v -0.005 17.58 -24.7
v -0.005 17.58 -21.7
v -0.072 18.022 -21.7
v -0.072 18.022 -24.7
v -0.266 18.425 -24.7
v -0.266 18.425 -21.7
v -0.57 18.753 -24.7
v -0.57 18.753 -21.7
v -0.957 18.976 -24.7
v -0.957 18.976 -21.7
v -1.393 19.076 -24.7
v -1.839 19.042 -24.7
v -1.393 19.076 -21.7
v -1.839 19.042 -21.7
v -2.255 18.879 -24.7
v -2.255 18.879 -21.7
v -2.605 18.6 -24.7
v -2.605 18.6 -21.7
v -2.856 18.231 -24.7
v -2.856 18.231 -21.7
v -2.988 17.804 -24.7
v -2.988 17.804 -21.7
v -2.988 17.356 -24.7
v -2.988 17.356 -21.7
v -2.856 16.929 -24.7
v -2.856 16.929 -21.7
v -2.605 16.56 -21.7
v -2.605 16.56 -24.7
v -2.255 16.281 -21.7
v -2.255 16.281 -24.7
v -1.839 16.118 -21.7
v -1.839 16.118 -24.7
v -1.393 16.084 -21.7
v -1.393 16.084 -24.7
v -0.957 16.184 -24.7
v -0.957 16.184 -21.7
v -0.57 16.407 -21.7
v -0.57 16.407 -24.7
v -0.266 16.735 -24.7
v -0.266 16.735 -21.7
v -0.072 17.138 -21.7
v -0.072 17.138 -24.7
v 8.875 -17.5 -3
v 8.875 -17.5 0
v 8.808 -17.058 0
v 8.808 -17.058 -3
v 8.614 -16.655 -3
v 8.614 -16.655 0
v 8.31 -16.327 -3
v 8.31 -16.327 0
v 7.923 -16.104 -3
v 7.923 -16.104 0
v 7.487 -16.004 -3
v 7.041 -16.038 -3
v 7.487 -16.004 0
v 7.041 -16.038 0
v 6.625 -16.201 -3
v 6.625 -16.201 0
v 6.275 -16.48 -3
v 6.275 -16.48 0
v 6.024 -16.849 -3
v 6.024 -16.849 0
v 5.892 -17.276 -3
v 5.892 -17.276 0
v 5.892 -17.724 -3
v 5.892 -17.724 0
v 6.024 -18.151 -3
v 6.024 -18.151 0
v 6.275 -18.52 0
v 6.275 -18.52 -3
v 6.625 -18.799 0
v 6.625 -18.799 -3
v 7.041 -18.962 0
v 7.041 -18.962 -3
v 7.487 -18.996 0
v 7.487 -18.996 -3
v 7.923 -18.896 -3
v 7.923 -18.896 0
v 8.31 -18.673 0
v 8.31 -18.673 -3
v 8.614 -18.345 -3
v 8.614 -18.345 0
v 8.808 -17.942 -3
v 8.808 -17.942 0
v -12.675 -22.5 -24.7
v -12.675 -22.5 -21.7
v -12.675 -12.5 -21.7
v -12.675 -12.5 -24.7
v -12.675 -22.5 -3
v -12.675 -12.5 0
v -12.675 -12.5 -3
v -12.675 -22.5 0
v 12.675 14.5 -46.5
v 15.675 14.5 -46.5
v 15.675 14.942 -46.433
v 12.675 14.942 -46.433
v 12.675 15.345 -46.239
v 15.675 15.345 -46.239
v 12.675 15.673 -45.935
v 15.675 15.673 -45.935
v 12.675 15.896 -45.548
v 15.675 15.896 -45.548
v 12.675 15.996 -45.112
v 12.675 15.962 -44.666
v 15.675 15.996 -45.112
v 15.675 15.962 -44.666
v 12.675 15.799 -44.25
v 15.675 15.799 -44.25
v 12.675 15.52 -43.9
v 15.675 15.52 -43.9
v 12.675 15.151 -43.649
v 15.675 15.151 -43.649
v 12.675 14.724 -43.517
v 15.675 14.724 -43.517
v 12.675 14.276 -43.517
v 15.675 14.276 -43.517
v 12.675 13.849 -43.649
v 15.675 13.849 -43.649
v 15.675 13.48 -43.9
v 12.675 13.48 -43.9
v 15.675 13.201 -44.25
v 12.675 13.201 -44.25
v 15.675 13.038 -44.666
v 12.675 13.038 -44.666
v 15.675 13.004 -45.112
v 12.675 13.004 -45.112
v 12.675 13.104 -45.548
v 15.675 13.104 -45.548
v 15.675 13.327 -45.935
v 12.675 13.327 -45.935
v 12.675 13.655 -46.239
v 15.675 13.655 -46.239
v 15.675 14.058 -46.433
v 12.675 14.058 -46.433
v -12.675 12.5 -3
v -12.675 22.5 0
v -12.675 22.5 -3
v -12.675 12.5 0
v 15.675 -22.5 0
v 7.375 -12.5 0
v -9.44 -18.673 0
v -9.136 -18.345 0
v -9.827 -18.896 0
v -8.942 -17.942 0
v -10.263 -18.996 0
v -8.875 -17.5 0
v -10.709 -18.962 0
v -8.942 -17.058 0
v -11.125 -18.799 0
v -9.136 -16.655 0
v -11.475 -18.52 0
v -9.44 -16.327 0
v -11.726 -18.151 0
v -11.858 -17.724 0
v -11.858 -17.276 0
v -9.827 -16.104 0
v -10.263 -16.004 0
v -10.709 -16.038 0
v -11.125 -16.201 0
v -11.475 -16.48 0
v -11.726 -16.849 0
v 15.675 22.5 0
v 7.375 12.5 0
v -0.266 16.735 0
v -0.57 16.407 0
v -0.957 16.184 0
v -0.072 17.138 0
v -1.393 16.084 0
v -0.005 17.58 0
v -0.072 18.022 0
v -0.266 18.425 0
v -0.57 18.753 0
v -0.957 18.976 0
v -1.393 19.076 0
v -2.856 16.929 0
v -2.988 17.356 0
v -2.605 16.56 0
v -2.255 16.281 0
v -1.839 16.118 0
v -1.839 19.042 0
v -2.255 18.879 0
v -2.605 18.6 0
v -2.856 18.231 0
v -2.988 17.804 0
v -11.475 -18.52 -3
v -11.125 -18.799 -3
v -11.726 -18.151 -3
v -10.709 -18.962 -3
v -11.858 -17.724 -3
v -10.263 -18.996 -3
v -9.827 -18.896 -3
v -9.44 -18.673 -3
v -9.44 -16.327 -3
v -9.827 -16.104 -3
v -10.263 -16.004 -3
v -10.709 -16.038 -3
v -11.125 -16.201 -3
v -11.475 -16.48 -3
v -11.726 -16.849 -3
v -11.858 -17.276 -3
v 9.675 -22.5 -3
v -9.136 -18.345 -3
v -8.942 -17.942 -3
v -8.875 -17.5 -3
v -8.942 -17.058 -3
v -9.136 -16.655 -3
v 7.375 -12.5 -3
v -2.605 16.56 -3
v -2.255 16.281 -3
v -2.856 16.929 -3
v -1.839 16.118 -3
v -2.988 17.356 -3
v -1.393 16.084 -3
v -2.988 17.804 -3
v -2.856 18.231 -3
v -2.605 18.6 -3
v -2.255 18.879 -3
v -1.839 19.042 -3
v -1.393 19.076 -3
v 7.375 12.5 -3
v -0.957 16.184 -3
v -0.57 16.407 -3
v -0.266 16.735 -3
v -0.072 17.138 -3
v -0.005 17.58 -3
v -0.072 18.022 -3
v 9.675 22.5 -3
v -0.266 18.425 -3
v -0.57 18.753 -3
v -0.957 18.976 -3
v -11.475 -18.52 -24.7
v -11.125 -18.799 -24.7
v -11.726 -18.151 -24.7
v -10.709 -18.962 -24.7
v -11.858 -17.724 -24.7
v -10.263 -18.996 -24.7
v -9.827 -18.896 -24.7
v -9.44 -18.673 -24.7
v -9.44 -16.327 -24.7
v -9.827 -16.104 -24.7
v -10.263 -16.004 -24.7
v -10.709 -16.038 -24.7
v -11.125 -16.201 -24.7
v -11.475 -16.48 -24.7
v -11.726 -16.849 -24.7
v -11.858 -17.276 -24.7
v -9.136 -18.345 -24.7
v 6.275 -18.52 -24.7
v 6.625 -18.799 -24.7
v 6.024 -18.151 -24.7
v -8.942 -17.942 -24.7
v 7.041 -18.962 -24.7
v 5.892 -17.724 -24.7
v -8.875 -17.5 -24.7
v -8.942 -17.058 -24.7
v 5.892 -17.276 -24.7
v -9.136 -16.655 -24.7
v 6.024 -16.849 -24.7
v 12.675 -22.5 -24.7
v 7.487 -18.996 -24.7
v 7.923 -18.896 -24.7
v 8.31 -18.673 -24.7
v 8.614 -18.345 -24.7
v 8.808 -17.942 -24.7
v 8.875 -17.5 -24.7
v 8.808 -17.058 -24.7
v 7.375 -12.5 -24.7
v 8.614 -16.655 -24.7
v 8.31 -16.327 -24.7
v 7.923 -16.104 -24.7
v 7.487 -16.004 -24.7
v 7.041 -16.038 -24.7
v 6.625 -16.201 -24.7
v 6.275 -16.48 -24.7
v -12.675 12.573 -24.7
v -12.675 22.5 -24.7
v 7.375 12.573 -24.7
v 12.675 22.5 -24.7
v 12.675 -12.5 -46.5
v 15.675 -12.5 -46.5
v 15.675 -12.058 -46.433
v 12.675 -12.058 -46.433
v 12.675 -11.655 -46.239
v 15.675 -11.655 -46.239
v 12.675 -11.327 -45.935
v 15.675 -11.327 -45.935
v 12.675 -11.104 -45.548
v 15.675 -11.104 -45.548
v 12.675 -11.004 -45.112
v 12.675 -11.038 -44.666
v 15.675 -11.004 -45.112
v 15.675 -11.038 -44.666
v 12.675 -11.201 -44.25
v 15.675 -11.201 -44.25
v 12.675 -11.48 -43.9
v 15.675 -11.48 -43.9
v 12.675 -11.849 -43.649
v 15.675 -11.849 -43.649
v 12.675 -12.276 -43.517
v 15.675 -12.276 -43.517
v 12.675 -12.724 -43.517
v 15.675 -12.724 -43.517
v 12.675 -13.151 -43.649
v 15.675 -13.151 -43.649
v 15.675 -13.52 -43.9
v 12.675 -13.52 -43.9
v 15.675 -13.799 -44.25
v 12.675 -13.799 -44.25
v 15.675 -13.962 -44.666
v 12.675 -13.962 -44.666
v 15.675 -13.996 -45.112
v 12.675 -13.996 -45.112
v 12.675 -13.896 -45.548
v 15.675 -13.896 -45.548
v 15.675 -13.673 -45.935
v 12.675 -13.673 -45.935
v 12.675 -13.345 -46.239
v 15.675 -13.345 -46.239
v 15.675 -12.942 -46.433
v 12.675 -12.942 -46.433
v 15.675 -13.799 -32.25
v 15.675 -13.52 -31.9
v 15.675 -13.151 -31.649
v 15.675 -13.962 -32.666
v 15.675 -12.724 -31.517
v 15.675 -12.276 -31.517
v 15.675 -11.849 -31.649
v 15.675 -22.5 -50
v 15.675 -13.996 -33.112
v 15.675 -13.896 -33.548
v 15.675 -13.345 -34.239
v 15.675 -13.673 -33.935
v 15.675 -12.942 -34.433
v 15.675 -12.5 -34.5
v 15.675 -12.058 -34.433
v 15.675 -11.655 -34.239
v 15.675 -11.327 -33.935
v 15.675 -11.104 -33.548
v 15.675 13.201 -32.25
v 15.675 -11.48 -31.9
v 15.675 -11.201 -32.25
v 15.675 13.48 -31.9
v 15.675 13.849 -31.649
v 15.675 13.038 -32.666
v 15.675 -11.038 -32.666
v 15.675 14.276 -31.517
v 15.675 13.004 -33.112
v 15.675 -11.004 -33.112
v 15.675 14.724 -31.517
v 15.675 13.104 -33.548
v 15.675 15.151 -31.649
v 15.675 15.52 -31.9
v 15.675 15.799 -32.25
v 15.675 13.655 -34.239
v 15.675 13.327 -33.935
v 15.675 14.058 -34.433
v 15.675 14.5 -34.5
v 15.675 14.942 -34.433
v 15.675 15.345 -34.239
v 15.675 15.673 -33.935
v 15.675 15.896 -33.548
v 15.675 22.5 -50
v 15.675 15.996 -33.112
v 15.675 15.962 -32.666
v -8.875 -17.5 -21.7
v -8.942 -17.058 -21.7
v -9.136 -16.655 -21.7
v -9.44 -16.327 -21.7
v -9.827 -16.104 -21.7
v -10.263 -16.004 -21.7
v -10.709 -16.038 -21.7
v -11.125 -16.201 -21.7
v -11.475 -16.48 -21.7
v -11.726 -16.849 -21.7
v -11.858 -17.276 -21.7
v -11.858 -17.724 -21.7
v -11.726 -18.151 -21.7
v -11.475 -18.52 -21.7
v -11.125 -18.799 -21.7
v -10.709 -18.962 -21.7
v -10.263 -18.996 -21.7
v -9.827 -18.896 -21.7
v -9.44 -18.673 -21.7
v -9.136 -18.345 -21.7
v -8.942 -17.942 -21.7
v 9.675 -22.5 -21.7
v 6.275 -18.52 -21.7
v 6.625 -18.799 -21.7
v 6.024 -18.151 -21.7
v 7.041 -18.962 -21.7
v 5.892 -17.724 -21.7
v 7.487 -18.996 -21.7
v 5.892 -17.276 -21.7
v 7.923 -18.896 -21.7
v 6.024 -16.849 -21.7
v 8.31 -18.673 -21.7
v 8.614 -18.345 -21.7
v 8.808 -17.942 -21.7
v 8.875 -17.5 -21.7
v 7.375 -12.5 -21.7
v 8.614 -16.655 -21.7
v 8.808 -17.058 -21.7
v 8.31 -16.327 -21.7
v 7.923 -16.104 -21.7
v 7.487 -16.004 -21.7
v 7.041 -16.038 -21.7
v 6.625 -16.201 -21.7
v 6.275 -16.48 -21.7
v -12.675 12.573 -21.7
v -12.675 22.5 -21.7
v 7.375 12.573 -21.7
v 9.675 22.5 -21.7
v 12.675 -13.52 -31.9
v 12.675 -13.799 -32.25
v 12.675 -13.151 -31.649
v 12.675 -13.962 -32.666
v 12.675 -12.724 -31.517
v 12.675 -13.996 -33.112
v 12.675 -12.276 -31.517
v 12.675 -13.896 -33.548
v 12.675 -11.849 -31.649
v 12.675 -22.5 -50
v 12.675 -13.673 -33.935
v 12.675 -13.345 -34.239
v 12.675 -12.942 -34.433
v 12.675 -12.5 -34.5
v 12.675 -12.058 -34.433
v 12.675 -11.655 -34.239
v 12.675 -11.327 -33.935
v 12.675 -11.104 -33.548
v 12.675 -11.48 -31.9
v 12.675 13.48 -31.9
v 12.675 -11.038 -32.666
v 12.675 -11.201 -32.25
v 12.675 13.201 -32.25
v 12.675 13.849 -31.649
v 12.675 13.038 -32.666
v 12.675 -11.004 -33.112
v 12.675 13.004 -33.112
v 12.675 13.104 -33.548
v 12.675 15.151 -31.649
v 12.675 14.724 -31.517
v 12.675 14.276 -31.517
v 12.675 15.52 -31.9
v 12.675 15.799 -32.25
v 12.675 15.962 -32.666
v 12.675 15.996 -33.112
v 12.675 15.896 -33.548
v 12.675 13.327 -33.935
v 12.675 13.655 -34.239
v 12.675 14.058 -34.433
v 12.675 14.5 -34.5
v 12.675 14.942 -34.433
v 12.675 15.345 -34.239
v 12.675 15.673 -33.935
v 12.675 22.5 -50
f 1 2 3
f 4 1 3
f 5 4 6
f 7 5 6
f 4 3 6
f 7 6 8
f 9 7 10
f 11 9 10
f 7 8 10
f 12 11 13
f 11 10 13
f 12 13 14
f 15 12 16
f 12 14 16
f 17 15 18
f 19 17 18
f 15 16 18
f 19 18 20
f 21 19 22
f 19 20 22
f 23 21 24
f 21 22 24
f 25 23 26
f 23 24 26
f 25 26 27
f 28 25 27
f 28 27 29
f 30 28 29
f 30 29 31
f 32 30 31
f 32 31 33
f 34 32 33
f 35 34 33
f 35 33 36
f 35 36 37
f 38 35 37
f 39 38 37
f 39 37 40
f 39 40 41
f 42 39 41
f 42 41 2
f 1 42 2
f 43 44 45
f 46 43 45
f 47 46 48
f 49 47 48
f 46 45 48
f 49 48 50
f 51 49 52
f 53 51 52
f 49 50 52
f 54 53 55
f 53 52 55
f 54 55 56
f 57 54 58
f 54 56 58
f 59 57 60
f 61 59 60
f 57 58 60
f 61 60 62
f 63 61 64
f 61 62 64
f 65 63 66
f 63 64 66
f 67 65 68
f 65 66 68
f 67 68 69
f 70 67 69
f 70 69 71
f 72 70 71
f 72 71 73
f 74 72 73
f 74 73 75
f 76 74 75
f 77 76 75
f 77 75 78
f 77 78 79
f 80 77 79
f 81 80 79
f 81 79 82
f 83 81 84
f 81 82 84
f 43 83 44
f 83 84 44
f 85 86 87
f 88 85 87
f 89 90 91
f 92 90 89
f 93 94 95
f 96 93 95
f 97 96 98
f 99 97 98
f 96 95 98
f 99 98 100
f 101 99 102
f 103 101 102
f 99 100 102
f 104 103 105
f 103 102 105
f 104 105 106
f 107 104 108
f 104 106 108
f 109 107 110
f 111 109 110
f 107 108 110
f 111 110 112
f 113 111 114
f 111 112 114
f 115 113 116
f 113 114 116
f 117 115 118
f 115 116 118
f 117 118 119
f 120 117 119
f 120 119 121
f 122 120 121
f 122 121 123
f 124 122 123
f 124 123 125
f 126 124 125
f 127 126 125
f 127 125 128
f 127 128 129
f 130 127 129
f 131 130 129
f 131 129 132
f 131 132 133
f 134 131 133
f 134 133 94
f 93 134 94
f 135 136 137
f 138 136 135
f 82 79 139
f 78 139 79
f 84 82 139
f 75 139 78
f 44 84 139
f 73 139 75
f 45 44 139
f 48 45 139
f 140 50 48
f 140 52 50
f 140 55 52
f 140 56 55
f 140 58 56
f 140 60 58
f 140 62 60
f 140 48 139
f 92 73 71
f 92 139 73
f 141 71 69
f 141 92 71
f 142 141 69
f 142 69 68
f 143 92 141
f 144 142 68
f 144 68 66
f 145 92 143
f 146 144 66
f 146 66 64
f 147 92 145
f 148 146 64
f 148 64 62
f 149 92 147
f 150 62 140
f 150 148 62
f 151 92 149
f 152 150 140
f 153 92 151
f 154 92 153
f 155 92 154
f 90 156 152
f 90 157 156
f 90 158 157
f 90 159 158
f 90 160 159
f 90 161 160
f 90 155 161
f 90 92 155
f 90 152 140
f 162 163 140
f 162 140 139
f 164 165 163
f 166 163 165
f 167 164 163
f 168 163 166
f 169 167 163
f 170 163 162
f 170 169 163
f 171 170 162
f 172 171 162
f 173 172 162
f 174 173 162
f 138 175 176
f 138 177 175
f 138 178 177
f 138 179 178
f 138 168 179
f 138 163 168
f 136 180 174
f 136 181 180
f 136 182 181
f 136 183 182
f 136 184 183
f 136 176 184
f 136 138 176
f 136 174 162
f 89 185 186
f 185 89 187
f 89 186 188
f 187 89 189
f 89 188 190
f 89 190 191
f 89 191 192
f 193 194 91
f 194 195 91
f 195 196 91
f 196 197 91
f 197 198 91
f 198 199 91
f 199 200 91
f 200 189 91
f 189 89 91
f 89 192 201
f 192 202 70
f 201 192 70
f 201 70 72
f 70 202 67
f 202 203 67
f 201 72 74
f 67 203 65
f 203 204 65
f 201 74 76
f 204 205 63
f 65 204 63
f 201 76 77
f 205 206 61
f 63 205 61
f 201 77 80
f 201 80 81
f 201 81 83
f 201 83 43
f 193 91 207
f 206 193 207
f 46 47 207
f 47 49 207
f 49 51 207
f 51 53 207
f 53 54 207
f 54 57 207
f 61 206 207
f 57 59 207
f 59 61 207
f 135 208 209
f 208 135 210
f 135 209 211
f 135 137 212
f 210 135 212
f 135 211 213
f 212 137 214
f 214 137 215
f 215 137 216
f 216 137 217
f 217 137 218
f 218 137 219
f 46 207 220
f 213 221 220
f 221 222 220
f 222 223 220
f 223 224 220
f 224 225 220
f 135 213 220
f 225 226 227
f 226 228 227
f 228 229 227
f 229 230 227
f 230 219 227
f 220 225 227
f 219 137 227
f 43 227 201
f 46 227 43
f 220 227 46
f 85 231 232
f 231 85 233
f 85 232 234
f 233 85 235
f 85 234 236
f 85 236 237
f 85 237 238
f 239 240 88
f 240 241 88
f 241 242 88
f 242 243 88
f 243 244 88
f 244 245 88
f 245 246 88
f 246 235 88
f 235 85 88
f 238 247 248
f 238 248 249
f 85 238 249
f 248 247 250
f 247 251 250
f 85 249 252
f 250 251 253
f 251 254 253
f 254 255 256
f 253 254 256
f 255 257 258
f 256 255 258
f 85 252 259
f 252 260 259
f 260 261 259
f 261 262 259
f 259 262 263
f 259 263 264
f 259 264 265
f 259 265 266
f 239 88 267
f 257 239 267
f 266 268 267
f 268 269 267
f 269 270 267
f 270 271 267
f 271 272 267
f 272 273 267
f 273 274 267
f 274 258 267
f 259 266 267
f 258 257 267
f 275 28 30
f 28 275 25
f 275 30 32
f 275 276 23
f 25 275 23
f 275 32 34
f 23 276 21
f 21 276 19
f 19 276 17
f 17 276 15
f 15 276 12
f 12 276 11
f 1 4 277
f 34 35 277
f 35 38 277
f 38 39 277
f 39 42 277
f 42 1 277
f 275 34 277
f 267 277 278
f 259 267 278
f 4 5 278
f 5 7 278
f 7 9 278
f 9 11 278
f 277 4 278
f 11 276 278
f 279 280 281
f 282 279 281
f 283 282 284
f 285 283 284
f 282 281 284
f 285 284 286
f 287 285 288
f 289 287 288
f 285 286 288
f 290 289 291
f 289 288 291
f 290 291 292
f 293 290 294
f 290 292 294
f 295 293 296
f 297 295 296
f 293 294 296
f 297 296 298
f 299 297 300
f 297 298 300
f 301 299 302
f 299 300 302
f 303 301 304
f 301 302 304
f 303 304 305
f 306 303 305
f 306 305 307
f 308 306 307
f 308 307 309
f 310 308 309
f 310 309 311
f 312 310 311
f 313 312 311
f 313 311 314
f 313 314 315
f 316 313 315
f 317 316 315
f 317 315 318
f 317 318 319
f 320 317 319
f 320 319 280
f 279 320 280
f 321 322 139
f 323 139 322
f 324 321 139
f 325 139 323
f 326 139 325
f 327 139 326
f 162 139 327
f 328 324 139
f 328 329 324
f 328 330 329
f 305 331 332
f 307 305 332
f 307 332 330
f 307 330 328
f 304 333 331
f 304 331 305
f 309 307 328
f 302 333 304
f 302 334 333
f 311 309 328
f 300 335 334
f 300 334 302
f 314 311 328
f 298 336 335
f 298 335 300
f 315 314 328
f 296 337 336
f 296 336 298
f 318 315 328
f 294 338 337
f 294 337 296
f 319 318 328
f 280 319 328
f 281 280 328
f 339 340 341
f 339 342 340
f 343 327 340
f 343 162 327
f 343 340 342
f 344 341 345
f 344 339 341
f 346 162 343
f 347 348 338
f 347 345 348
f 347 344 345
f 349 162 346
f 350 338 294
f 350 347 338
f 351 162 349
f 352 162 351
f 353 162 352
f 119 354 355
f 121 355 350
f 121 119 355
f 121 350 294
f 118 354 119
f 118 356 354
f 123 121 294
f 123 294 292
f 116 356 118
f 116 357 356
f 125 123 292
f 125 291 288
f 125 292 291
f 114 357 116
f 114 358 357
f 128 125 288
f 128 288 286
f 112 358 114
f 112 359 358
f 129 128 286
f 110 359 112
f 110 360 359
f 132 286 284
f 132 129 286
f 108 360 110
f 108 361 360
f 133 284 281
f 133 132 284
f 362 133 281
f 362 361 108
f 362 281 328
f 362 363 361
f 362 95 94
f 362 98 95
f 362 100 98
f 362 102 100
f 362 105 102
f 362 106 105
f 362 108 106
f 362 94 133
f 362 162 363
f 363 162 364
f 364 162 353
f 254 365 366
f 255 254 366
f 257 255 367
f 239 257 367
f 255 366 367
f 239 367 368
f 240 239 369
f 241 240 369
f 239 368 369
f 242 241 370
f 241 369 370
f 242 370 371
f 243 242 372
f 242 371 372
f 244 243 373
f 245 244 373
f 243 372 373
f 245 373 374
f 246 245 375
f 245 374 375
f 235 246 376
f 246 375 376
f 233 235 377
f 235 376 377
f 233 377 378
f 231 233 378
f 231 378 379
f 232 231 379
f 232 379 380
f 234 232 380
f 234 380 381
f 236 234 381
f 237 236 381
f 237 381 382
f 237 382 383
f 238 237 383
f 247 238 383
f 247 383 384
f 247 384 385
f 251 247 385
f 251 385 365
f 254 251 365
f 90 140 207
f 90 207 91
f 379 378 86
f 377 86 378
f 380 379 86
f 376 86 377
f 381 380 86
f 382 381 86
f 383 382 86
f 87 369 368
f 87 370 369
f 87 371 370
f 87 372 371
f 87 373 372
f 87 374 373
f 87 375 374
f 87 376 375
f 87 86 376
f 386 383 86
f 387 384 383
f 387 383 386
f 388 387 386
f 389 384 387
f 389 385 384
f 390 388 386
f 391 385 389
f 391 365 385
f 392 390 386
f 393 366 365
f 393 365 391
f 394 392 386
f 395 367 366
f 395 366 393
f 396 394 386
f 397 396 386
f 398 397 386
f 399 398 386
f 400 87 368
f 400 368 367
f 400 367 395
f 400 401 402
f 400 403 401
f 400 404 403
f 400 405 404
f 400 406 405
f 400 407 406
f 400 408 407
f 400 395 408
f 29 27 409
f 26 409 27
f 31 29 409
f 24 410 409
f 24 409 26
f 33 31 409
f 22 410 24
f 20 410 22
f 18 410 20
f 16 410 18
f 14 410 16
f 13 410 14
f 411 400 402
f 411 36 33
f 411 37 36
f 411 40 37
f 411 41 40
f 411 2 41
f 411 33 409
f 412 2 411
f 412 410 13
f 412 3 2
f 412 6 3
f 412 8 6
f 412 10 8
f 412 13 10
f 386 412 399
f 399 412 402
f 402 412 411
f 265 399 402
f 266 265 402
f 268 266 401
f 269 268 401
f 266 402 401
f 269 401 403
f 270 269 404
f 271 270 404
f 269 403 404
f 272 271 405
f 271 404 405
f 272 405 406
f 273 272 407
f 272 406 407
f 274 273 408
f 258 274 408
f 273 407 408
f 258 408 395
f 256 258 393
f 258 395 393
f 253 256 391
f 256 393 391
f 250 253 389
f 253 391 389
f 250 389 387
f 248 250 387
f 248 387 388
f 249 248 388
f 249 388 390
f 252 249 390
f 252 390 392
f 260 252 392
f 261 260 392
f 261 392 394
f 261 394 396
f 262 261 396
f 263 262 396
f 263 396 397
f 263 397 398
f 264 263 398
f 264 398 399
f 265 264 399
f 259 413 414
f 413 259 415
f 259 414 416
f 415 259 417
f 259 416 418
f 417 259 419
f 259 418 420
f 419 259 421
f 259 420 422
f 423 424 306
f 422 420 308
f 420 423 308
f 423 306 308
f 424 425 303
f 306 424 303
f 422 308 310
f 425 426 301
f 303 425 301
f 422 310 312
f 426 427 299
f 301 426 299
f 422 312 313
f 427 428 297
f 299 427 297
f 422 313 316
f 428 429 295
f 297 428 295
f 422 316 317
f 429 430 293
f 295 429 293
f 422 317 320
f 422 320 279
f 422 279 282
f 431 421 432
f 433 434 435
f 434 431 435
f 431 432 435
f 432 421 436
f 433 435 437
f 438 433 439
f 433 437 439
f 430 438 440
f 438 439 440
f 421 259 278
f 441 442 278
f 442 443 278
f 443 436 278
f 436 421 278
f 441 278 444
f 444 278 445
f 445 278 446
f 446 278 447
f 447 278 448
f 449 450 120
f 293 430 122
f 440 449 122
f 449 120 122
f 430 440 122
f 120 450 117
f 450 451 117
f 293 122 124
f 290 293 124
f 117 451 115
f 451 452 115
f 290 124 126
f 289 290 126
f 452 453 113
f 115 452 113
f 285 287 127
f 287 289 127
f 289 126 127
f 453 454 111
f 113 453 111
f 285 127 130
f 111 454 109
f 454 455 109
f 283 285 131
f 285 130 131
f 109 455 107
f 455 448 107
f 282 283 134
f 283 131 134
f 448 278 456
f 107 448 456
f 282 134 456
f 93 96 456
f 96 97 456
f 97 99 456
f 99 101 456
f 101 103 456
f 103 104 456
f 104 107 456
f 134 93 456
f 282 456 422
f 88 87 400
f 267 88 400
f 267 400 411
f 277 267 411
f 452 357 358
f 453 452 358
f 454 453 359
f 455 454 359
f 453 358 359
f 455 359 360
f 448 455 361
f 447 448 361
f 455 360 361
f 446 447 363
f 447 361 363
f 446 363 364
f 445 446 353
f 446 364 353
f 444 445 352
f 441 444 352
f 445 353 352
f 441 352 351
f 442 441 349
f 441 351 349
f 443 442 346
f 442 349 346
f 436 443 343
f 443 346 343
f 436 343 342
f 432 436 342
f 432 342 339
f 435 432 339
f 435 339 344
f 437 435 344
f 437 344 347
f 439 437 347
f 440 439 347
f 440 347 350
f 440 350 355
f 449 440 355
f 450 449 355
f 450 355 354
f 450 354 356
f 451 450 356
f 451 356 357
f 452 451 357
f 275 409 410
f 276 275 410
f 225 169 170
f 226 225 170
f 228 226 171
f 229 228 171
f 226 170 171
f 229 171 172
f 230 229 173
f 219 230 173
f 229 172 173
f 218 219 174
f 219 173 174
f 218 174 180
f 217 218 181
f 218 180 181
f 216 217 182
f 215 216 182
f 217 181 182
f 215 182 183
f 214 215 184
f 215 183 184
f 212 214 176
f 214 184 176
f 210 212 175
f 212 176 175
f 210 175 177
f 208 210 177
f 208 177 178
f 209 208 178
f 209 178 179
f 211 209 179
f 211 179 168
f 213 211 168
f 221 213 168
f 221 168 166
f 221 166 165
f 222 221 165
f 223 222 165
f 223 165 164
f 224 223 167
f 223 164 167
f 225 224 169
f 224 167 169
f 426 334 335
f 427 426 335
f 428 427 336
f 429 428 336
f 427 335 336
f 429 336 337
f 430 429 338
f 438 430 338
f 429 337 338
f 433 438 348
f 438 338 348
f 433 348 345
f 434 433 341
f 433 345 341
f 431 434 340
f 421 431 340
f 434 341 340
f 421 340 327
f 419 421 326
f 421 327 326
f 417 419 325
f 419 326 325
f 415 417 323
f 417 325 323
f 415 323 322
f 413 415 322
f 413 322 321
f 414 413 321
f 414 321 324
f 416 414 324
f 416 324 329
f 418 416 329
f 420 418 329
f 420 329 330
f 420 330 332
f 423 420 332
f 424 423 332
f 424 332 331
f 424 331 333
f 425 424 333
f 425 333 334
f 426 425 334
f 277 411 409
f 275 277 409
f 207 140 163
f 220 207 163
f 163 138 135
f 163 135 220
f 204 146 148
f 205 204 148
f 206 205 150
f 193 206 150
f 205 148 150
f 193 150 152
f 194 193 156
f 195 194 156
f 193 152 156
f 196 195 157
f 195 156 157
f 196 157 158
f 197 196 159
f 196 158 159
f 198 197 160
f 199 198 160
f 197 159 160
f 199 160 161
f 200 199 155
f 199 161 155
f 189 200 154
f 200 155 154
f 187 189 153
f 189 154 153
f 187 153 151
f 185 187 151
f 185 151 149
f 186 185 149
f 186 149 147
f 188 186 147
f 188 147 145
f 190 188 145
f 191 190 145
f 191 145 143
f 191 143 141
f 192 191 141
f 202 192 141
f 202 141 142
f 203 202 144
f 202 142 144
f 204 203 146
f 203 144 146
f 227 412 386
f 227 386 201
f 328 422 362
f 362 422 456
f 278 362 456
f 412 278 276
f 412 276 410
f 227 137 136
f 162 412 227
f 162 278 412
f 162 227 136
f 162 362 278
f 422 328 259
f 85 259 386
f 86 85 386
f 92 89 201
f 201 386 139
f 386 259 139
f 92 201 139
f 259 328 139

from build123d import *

# Parameters (mm, degrees)
SKETCH2_W           = 5.3
SKETCH2_H           = 25
SKETCH2_R           = 1.5
BOSS_EXTRUDE1_DEPTH = 3
SKETCH3_W           = 50
SKETCH3_H           = 45
BOSS_EXTRUDE2_DEPTH = 3
SKETCH7_W           = 38.35
SKETCH7_H           = 3
BOSS_EXTRUDE3_DEPTH = 45
CUT_EXTRUDE1_DEPTH  = 5
SKETCH8_3_R         = 1.5
CUT_EXTRUDE2_DEPTH  = 5
SKETCH11_R          = 1.5
CUT_EXTRUDE4_DEPTH  = 5
SKETCH12_W          = 18.7
SKETCH12_H          = 45
BOSS_EXTRUDE4_DEPTH = 3


with BuildPart() as part:
    # Sketch2 → Boss-Extrude1 (new body)
    # profile 1 of 3: a face of its own
    with BuildSketch(Plane.XY):
        with Locations((10.025, 0)):
            Rectangle(SKETCH2_W, SKETCH2_H)
    # profile 2 of 3: a face of its own
    with BuildSketch(Plane.XY):
        Polygon((7.375, 12.5), (12.675, 12.5), (12.675, 22.5), (-12.675, 22.5), (-12.675, 12.5), align=None)
        with Locations((-1.505, 17.58)):
            Circle(SKETCH2_R, mode=Mode.SUBTRACT)
    # profile 3 of 3: a face of its own
    with BuildSketch(Plane.XY):
        Polygon((-12.675, -22.5), (12.675, -22.5), (12.675, -12.5), (7.375, -12.5), (-12.675, -12.5), align=None)
        with Locations((-10.375, -17.5)):
            Circle(SKETCH2_R, mode=Mode.SUBTRACT)
        with Locations((7.375, -17.5)):
            Circle(SKETCH2_R, mode=Mode.SUBTRACT)
    extrude(amount=-BOSS_EXTRUDE1_DEPTH)

    # Sketch3 → Boss-Extrude2 (add)
    with BuildSketch(Plane(origin=(12.675, 0, 0), x_dir=(0, 0, -1), z_dir=(1, 0, 0))):
        with Locations((25, 0)):
            Rectangle(SKETCH3_W, SKETCH3_H)
    extrude(amount=BOSS_EXTRUDE2_DEPTH)

    # Sketch7 → Boss-Extrude3 (add)
    with BuildSketch(Plane(origin=(0, 22.5, 0), x_dir=(1, 0, 0), z_dir=(0, 1, 0))):
        with Locations((-3.5, 23.2)):
            Rectangle(SKETCH7_W, SKETCH7_H)
    extrude(amount=-BOSS_EXTRUDE3_DEPTH)

    # Sketch8 → Cut-Extrude1 (cut)
    with BuildSketch(Plane.XY.offset(-21.7)):
        Polygon((-12.675, 12.572802409), (-12.675, 22.5), (-22.675, 22.5), (-22.675, -22.5), (-12.675, -22.5), (-12.675, -12.5), (7.375, -12.5), (7.375, 12.572802409), align=None)
    extrude(amount=-CUT_EXTRUDE1_DEPTH, mode=Mode.SUBTRACT)

    # Sketch8<3> → Cut-Extrude2 (cut)
    with BuildSketch(Plane.XY.offset(-21.7)):
        with Locations((-1.505, 17.58)):
            Circle(SKETCH8_3_R)
        with Locations((-10.375, -17.5)):
            Circle(SKETCH8_3_R)
        with Locations((7.375, -17.5)):
            Circle(SKETCH8_3_R)
    extrude(amount=-CUT_EXTRUDE2_DEPTH, mode=Mode.SUBTRACT)

    # Sketch11 → Cut-Extrude4 (cut)
    with BuildSketch(Plane(origin=(15.675, 0, 0), x_dir=(0, 0, -1), z_dir=(1, 0, 0))):
        with Locations((33, 14.5)):
            Circle(SKETCH11_R)
        with Locations((45, 14.5)):
            Circle(SKETCH11_R)
        with Locations((33, -12.5)):
            Circle(SKETCH11_R)
        with Locations((45, -12.5)):
            Circle(SKETCH11_R)
    extrude(amount=-CUT_EXTRUDE4_DEPTH, mode=Mode.SUBTRACT)

    # Sketch12 → Boss-Extrude4 (add)
    with BuildSketch(Plane.ZY.offset(-12.675)):
        with Locations((-12.35, 0)):
            Rectangle(SKETCH12_W, SKETCH12_H)
    extrude(amount=BOSS_EXTRUDE4_DEPTH)


solid = part.part
